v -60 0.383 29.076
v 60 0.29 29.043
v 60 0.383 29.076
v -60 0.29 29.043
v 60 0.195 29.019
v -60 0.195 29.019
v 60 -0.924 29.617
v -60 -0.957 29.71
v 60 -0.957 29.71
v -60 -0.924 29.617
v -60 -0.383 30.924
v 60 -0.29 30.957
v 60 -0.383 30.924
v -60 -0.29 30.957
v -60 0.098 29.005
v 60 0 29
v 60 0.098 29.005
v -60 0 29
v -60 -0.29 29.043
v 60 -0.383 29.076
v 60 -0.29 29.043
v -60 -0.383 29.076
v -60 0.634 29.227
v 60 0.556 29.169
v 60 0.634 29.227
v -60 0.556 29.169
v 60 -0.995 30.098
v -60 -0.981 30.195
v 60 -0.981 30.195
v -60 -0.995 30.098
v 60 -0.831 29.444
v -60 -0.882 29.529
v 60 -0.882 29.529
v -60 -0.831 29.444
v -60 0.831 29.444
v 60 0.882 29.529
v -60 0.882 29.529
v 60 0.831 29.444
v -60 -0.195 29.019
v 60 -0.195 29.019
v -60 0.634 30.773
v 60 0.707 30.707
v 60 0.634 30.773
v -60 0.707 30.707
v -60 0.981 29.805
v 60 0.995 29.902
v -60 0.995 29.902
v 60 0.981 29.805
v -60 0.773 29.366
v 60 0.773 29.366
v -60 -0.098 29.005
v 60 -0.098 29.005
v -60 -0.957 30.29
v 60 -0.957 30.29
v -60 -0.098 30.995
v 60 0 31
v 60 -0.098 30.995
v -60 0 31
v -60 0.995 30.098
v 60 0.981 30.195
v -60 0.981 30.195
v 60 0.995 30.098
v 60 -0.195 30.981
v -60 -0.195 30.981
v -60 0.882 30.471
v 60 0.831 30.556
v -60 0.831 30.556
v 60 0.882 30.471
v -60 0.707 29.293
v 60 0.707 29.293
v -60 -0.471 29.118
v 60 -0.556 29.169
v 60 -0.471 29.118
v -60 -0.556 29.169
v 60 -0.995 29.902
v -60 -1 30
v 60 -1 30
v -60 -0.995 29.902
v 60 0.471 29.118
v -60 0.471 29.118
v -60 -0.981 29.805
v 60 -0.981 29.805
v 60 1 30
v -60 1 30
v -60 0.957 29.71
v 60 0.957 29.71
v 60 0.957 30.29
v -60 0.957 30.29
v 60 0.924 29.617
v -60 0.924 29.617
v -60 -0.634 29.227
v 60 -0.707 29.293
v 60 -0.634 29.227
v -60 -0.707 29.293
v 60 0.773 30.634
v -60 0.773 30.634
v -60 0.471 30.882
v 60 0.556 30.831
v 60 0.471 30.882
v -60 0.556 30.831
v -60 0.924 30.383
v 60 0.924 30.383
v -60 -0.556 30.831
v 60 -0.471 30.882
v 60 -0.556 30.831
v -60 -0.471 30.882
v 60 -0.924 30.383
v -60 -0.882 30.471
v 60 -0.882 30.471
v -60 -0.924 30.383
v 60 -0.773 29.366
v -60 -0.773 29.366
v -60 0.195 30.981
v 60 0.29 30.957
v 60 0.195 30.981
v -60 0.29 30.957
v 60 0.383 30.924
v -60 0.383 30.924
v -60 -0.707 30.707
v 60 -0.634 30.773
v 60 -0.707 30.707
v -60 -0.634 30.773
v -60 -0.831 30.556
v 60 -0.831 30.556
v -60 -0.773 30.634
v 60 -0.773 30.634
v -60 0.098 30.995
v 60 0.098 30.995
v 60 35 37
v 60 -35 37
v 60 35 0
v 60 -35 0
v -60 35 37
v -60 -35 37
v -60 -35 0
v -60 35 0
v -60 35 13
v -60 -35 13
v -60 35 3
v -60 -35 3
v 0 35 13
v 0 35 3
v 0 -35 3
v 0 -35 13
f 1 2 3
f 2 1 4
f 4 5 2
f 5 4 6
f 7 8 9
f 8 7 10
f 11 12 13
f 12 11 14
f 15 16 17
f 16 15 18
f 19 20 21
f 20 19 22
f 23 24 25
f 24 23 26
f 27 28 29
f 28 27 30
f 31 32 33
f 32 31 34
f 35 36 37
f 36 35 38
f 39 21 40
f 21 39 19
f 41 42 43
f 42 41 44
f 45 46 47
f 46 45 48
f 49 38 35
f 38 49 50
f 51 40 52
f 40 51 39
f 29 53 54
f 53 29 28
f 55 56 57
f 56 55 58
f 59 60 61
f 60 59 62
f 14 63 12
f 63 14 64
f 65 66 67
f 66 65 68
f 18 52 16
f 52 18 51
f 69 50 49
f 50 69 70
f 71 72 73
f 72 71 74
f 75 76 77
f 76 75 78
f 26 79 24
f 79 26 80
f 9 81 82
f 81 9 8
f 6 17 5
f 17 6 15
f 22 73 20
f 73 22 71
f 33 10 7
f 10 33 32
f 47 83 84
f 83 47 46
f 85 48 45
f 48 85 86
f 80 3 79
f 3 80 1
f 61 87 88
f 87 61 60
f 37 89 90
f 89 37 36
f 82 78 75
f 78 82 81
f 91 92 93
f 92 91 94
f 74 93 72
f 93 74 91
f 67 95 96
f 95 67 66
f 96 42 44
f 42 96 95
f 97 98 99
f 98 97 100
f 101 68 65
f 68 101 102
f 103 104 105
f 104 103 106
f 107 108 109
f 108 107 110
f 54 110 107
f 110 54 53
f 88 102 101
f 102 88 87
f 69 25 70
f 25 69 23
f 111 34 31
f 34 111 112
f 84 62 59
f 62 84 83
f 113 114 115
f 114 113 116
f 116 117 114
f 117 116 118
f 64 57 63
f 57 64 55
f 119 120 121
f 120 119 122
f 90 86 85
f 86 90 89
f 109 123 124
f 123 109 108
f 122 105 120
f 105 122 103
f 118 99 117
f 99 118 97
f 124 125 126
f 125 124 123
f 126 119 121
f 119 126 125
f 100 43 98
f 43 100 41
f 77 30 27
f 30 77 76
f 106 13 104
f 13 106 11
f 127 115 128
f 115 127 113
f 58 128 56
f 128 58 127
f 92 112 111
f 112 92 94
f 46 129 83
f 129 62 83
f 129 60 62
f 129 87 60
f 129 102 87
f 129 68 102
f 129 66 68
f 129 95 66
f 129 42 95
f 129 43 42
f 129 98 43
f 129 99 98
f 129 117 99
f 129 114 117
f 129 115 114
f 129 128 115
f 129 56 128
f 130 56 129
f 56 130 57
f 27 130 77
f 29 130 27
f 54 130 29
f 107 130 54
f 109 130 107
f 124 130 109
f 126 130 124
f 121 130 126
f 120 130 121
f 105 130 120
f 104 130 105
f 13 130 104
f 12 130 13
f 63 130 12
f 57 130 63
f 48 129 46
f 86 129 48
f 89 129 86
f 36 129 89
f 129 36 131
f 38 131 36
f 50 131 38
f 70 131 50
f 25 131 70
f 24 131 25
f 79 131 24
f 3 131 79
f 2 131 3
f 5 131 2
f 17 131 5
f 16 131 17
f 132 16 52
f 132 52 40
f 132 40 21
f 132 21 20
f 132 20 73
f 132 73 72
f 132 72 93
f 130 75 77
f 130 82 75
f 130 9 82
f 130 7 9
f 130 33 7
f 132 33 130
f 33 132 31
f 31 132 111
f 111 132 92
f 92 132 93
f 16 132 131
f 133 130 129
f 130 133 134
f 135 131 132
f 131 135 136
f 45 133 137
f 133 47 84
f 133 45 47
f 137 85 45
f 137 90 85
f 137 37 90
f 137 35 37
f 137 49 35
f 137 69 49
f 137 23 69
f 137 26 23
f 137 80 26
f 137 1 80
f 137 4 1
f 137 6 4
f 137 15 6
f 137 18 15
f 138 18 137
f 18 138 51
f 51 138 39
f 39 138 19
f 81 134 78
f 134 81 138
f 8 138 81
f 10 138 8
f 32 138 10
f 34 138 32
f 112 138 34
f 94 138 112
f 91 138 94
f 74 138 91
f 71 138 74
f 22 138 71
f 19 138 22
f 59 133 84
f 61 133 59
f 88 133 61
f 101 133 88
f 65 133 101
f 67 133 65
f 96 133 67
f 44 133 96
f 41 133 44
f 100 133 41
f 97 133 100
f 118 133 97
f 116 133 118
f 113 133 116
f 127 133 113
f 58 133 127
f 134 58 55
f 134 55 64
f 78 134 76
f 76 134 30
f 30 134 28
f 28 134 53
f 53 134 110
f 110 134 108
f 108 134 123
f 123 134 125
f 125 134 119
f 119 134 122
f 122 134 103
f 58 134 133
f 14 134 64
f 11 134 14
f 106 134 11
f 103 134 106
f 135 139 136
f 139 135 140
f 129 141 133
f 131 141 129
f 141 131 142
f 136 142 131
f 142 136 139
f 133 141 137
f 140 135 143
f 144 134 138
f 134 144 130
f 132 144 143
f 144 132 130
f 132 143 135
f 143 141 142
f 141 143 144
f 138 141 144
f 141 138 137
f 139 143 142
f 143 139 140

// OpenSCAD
// Buffer tank for mini horizontal gel-electrophoresis box
// Print orientation: tank rests on XY plane at z = 0, open top at z = 40

// ---------- Parameters ----------
outer_x   = 120;   // outer length (X)
outer_y   = 70;    // outer width (Y)
outer_z   = 40;    // outer height (Z)
wall      = 3;     // wall thickness
floor     = 3;     // floor thickness

inner_h   = outer_z - wall;                    // inner height above floor (37)
platform_t= 10;   // platform thickness above inner floor
platform_top = inner_h - floor + platform_t;   // platform top z = 13 (floor at z=3)

eps       = 0.5;  // cutter overshoot past faces

$fn = 64;

// ---------- Model ----------
difference() {
    // Main tank body (open top)
    translate([-outer_x/2, -outer_y/2, 0])
        cube([outer_x, outer_y, outer_z - wall]);

    // Gel-tray platform, centred in X, full inner width in Y
    translate([-outer_x/2, -outer_y/2, floor])
        cube([60, outer_y, platform_t]);

    // Horizontal electrode holes through each end wall, along X, at y = 0, z = 30
    for (sx = [-1, 1])
        translate([sx > 0 ? outer_x/2 - eps : -outer_x/2 - eps, 0, 30])
            rotate([0, 90, 0])
                cylinder(d = 2, h = outer_x + 2*eps);
}
